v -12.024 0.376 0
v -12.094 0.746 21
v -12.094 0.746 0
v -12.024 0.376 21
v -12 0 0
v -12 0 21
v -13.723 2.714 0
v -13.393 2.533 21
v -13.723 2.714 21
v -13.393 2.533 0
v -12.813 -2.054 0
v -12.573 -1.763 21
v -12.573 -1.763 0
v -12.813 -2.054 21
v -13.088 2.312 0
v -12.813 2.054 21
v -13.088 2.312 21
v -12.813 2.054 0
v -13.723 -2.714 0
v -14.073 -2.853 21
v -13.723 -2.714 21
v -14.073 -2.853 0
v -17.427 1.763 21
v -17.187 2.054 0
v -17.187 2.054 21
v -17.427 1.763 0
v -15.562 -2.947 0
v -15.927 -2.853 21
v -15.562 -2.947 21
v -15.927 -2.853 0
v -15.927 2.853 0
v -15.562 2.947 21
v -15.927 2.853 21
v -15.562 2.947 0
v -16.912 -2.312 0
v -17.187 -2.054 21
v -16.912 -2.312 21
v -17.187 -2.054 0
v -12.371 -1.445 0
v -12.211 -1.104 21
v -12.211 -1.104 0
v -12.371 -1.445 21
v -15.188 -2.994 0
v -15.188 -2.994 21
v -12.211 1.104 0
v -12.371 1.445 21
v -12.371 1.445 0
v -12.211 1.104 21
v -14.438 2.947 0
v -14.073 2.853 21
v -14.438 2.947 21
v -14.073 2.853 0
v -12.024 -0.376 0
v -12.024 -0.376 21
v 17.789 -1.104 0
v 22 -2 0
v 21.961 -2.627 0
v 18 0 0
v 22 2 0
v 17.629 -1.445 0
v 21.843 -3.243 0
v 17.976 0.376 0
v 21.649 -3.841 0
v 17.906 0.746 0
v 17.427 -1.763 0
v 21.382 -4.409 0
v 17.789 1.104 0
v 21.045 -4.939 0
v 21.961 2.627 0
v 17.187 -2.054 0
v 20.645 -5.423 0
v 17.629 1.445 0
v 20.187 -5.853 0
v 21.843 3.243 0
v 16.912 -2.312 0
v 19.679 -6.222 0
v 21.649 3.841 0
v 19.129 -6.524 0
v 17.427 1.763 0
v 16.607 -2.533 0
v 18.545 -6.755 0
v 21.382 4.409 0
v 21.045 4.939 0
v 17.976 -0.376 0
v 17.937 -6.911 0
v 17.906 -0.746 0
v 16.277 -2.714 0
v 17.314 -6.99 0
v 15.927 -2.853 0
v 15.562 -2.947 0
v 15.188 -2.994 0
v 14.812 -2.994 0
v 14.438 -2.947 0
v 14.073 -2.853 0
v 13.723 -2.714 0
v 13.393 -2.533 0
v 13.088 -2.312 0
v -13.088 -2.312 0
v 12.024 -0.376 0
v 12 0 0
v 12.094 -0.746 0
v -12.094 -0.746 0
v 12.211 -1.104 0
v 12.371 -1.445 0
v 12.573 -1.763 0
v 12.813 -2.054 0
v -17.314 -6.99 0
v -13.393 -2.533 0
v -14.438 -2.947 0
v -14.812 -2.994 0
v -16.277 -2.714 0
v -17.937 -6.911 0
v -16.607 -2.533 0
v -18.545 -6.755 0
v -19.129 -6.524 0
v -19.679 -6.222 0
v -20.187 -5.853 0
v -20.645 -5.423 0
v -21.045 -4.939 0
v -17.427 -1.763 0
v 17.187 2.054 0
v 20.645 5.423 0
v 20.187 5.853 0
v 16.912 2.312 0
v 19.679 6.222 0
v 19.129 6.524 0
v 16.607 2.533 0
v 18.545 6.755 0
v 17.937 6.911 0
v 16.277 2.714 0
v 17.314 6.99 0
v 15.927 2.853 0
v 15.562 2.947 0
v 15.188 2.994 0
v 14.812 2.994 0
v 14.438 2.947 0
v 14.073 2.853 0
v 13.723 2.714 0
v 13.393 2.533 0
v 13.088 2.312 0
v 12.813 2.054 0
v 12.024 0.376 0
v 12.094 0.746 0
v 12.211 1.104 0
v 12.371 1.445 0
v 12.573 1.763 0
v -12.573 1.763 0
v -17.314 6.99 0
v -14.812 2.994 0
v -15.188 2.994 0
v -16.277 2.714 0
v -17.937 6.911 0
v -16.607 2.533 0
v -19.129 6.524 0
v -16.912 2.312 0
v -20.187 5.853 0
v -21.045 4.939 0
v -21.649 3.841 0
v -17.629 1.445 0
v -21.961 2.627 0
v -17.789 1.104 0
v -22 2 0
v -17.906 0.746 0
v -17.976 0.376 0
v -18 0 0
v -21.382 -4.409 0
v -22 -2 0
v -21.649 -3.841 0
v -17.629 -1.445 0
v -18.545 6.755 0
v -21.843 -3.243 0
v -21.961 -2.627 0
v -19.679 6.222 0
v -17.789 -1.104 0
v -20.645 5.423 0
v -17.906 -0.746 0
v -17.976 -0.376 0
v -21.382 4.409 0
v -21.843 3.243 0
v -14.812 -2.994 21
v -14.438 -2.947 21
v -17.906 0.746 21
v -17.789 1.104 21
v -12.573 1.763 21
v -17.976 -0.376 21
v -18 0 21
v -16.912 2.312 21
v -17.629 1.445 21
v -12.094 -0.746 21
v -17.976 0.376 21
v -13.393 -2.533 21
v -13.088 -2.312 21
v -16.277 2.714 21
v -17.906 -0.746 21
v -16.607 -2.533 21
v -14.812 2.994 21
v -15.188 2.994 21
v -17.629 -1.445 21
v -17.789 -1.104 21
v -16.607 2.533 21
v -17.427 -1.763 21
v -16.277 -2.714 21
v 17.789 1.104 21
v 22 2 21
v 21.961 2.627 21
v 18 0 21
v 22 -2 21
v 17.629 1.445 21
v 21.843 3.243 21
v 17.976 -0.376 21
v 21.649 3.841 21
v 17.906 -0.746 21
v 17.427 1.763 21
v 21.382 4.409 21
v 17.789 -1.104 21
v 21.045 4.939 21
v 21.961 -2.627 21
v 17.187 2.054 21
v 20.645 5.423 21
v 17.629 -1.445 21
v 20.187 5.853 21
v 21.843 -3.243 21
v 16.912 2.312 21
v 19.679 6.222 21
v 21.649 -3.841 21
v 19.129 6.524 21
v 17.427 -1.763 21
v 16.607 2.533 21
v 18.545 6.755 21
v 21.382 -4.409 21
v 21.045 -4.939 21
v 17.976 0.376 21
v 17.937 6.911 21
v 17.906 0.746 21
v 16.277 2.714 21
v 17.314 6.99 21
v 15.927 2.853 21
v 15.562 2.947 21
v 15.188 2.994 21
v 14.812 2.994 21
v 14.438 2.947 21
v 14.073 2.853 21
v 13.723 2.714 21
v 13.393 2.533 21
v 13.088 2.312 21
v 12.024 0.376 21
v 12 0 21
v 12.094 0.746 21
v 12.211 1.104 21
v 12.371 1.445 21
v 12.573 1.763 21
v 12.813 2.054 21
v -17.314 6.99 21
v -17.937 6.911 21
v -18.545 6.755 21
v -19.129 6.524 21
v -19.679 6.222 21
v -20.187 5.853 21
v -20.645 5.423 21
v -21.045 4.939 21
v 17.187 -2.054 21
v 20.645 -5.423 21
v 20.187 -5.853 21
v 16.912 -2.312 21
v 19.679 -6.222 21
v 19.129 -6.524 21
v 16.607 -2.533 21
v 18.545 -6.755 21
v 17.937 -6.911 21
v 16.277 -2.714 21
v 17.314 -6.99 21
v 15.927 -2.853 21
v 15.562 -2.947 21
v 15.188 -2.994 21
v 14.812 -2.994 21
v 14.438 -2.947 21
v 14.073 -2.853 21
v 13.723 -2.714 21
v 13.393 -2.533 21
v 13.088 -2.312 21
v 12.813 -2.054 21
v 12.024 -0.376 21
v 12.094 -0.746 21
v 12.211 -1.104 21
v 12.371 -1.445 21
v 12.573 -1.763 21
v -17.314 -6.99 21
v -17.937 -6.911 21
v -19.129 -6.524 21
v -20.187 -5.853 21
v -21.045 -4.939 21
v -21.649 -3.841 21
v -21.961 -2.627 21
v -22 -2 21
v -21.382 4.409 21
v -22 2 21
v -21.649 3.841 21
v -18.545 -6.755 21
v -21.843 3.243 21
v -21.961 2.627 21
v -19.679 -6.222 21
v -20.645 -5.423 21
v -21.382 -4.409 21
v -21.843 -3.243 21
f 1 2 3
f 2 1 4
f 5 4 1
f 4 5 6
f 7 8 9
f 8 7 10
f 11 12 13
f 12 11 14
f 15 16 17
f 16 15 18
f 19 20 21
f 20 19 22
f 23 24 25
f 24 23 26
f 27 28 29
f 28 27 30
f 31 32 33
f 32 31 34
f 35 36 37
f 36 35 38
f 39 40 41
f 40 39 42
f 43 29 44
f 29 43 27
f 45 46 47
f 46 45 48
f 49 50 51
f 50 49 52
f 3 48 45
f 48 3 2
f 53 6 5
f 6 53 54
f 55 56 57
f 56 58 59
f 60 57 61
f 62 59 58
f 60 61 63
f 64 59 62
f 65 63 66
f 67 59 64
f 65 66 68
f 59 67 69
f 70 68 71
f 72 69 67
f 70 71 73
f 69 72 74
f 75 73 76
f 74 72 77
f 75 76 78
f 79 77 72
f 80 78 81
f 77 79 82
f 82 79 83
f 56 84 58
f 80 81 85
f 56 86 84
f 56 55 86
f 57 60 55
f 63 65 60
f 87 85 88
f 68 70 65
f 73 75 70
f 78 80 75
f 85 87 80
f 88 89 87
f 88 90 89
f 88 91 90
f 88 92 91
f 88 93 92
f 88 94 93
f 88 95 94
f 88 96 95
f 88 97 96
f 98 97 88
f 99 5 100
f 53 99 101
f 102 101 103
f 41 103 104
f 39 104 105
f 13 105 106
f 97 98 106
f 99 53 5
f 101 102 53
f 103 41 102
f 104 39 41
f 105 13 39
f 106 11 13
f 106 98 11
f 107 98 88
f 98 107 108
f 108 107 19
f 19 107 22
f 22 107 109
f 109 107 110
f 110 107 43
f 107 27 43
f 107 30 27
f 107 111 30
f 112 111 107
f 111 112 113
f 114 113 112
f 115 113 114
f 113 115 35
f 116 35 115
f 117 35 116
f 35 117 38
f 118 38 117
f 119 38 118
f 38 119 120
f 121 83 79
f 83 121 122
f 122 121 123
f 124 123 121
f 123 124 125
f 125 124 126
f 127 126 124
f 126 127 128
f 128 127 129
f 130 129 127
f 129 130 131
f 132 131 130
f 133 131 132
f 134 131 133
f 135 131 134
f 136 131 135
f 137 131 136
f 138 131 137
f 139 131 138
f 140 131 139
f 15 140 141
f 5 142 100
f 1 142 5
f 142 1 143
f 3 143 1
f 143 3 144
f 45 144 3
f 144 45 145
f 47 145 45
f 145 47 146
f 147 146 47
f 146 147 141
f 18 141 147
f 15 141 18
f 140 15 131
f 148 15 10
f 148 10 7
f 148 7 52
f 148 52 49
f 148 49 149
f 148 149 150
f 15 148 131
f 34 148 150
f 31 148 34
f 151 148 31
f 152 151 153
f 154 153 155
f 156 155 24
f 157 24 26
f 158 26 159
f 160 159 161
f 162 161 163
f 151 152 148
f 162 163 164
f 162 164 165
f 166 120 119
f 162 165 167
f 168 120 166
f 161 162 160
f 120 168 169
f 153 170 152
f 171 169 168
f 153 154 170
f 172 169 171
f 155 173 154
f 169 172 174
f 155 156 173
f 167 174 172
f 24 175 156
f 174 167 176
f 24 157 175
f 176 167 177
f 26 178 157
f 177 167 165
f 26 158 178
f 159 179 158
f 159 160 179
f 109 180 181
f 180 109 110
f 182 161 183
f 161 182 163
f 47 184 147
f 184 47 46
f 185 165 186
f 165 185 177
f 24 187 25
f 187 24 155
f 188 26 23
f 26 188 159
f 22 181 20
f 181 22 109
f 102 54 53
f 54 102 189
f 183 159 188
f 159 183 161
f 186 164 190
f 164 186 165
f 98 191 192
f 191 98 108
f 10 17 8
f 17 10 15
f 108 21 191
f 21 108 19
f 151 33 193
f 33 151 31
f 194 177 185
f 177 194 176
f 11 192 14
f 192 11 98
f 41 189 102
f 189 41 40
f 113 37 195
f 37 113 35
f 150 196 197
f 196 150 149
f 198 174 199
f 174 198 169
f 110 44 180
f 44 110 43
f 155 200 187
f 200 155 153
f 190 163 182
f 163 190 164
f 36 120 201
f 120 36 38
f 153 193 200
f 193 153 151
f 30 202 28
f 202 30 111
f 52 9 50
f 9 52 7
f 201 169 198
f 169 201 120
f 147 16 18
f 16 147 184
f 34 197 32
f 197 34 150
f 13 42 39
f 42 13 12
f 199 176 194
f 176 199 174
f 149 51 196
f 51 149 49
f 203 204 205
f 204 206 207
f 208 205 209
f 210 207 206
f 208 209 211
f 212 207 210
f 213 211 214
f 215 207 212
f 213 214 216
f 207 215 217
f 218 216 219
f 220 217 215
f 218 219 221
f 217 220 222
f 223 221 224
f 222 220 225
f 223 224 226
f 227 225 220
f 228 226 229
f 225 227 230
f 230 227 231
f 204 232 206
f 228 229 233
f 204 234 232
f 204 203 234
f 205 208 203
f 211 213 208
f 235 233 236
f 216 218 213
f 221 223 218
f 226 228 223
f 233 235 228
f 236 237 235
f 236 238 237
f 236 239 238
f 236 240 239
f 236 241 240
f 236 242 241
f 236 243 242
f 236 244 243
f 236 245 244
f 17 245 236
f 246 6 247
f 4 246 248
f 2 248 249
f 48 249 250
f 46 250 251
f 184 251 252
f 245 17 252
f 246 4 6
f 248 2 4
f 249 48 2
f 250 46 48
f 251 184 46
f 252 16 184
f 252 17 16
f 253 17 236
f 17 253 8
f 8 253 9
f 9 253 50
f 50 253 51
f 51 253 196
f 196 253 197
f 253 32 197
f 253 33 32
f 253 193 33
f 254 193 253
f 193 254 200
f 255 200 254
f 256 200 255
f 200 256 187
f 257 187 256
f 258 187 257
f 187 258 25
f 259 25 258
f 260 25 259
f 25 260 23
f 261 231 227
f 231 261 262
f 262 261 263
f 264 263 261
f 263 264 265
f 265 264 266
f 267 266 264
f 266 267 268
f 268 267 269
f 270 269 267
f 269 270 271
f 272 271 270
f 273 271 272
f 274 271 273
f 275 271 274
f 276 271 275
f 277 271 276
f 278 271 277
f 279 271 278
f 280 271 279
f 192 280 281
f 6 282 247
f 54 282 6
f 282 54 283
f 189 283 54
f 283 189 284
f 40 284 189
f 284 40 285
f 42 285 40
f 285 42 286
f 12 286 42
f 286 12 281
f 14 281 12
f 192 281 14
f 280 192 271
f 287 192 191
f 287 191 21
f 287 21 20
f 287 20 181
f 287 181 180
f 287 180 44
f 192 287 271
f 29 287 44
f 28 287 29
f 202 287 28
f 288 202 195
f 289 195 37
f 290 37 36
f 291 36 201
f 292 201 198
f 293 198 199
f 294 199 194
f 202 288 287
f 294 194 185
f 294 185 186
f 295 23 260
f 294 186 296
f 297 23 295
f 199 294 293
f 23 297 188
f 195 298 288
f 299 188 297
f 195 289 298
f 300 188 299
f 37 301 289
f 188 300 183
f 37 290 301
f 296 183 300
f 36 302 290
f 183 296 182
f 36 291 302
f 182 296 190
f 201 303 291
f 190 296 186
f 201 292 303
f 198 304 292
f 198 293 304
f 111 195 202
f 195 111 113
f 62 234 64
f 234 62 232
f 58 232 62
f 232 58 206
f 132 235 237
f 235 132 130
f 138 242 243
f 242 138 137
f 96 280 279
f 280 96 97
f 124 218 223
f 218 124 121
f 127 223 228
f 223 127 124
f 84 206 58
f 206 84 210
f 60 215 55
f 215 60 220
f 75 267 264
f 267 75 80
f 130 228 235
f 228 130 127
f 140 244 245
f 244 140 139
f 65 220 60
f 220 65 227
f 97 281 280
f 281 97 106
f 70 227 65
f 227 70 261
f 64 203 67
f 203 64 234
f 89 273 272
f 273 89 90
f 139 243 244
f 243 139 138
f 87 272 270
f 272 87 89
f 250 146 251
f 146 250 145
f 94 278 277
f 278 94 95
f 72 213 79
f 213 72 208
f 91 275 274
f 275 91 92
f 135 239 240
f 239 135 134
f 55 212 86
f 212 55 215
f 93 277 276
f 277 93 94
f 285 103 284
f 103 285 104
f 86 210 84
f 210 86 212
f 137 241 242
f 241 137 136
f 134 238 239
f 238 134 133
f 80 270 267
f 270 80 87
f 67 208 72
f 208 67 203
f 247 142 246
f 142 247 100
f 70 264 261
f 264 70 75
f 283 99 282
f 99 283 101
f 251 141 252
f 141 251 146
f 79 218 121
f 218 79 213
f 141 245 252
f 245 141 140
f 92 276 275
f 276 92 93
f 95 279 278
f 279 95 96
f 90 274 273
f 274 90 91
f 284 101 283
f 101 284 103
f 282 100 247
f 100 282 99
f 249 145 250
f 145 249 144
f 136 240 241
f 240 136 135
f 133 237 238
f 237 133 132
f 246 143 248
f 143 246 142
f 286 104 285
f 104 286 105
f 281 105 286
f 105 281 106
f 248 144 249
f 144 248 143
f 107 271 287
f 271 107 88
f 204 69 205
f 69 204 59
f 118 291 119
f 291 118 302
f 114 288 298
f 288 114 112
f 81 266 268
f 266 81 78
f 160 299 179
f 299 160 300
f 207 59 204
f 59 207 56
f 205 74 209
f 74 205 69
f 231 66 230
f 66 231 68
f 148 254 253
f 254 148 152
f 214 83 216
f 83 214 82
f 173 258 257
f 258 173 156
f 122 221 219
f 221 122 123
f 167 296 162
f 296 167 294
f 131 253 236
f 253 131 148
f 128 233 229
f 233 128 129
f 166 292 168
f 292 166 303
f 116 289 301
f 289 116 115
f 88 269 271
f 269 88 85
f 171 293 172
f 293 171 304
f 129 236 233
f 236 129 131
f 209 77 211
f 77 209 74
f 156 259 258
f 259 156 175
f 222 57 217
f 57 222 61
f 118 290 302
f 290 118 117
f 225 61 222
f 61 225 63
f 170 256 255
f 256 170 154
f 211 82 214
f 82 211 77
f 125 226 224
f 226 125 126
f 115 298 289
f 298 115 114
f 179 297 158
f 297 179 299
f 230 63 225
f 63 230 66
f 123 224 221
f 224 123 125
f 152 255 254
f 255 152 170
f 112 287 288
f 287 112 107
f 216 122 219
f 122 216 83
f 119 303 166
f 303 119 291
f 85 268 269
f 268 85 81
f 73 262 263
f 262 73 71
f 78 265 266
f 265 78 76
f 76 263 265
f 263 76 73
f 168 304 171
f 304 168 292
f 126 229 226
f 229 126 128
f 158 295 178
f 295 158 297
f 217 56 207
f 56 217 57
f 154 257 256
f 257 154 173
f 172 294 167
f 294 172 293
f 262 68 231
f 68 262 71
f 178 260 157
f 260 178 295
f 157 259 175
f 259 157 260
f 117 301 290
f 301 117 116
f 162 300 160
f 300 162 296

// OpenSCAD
$fn = 50;


difference() {
	union() {
		hull() {
			translate(v = [-17.0000000000, 2.0000000000, 0]) {
				cylinder(h = 21, r = 5);
			}
			translate(v = [17.0000000000, 2.0000000000, 0]) {
				cylinder(h = 21, r = 5);
			}
			translate(v = [-17.0000000000, -2.0000000000, 0]) {
				cylinder(h = 21, r = 5);
			}
			translate(v = [17.0000000000, -2.0000000000, 0]) {
				cylinder(h = 21, r = 5);
			}
		}
	}
	union() {
		translate(v = [-15.0000000000, 0.0000000000, 0]) {
			cylinder(h = 21, r = 3.0000000000);
		}
		translate(v = [15.0000000000, 0.0000000000, 0]) {
			cylinder(h = 21, r = 3.0000000000);
		}
		translate(v = [-15.0000000000, 0.0000000000, 0]) {
			cylinder(h = 21, r = 1.5000000000);
		}
		translate(v = [15.0000000000, 0.0000000000, 0]) {
			cylinder(h = 21, r = 1.5000000000);
		}
		translate(v = [-15.0000000000, 0.0000000000, 0]) {
			cylinder(h = 21, r = 1.5000000000);
		}
		translate(v = [15.0000000000, 0.0000000000, 0]) {
			cylinder(h = 21, r = 1.5000000000);
		}
		translate(v = [-15.0000000000, 0.0000000000, 0]) {
			cylinder(h = 21, r = 1.5000000000);
		}
		translate(v = [15.0000000000, 0.0000000000, 0]) {
			cylinder(h = 21, r = 1.5000000000);
		}
	}
}
